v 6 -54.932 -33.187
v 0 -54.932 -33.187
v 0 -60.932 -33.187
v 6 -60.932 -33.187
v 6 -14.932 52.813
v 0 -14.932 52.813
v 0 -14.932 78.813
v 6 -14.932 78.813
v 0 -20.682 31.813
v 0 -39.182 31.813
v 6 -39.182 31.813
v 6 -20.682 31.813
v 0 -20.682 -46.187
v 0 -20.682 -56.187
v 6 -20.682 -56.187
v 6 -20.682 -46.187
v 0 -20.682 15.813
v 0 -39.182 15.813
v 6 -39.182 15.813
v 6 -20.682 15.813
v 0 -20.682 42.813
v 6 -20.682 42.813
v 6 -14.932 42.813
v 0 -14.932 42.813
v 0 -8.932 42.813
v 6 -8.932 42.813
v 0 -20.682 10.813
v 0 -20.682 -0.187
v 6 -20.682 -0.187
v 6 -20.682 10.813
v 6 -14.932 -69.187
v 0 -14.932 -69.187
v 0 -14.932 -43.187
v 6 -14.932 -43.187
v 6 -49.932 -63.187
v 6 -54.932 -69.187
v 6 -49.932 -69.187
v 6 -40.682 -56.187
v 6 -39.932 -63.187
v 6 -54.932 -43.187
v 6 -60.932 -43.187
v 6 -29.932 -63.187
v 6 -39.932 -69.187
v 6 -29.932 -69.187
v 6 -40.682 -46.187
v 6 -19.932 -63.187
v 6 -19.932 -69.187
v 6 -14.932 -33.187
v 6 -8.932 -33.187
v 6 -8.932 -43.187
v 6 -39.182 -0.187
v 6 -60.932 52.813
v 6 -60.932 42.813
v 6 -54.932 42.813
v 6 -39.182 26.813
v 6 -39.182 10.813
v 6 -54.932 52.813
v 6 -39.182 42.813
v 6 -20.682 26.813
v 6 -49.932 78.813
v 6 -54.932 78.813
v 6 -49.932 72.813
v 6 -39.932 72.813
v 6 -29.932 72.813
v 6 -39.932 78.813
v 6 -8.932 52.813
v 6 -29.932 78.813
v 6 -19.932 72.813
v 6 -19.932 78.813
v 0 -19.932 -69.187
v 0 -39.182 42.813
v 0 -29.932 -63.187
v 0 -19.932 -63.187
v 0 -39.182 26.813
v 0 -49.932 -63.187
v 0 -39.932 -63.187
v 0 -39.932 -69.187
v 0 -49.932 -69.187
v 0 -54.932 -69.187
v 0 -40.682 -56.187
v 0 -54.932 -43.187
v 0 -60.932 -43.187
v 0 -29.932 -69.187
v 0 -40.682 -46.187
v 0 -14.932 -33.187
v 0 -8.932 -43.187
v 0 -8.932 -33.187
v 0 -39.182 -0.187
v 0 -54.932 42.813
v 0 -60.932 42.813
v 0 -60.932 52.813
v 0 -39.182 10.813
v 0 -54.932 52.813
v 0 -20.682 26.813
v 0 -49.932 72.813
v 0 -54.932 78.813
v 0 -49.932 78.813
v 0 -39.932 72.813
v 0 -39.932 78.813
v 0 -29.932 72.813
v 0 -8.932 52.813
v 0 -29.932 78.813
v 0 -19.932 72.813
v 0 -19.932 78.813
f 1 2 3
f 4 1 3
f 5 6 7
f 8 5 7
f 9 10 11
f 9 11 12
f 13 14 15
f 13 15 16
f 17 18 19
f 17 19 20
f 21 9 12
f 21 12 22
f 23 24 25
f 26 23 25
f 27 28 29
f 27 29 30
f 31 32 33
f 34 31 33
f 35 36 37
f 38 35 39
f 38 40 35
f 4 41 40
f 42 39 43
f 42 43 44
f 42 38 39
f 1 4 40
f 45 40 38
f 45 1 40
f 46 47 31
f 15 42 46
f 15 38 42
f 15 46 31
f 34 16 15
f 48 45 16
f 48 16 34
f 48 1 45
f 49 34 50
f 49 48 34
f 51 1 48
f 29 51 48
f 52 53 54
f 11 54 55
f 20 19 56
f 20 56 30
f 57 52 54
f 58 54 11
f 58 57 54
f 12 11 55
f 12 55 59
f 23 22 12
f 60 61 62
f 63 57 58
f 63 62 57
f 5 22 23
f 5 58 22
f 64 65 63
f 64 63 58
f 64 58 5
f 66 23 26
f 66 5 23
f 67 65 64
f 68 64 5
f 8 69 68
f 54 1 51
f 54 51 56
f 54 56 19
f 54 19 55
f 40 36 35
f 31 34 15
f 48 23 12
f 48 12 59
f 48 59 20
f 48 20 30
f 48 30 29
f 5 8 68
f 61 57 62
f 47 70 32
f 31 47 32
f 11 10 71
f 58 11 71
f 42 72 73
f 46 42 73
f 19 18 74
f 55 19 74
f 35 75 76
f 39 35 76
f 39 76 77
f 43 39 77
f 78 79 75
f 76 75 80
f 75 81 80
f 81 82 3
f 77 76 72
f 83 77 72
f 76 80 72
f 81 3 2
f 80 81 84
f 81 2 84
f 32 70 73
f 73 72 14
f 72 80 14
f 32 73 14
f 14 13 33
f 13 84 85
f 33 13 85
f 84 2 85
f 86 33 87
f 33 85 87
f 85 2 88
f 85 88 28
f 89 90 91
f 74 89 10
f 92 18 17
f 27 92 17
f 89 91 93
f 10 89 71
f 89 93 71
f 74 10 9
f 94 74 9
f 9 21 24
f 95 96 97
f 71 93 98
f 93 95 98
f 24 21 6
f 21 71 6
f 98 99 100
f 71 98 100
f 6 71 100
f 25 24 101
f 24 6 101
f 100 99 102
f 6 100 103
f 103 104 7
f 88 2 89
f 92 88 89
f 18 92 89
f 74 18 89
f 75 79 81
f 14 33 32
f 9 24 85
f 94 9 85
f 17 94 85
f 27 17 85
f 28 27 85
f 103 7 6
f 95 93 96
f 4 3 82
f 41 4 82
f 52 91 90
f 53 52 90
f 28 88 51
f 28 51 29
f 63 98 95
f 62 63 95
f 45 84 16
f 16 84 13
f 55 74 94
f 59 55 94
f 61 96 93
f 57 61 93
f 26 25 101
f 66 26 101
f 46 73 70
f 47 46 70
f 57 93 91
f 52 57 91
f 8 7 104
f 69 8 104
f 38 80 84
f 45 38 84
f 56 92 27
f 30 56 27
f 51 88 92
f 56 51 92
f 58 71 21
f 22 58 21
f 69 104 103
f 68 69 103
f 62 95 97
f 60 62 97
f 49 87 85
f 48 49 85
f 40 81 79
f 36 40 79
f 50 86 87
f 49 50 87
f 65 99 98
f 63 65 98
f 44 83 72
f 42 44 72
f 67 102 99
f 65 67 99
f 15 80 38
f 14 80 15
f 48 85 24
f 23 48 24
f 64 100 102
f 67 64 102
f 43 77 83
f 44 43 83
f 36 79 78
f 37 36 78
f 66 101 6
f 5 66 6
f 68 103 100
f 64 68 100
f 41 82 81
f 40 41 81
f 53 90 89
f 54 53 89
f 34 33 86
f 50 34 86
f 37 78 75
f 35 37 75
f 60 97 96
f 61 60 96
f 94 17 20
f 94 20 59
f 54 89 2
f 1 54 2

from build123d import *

# Parameters (mm, degrees)
F0_W     = 20
F0_H     = 10
F0_W_2   = 18.5
F0_H_2   = 11
F1_DEPTH = 6


with BuildPart() as f1:
    # F0 (on Right) → F1 (new body)
    with BuildSketch(Plane.YZ):
        Polygon((-60.931503, 42.813338), (-54.931503, 42.813338), (-54.931503, -33.186662), (-60.931503, -33.186662), (-60.931503, -43.186662), (-54.931503, -43.186662), (-54.931503, -69.186662), (-49.931503, -69.186662), (-49.931503, -63.186662), (-39.931503, -63.186662), (-39.931503, -69.186662), (-29.931503, -69.186662), (-29.931503, -63.186662), (-19.931503, -63.186662), (-19.931503, -69.186662), (-14.931503, -69.186662), (-14.931503, -43.186662), (-8.931503, -43.186662), (-8.931503, -33.186662), (-14.931503, -33.186662), (-14.931503, 42.813338), (-8.931503, 42.813338), (-8.931503, 52.813338), (-14.931503, 52.813338), (-14.931503, 78.813338), (-19.931503, 78.813338), (-19.931503, 72.813338), (-29.931503, 72.813338), (-29.931503, 78.813338), (-39.931503, 78.813338), (-39.931503, 72.813338), (-49.931503, 72.813338), (-49.931503, 78.813338), (-54.931503, 78.813338), (-54.931503, 52.813338), (-60.931503, 52.813338), align=None)
        with Locations((-30.681503, -51.186662)):
            Rectangle(F0_W, F0_H, mode=Mode.SUBTRACT)
        with Locations((-29.931503, 5.313338)):
            Rectangle(F0_W_2, F0_H_2, mode=Mode.SUBTRACT)
        with Locations((-29.931503, 21.313338)):
            Rectangle(F0_W_2, F0_H_2, mode=Mode.SUBTRACT)
        with Locations((-29.931503, 37.313338)):
            Rectangle(F0_W_2, F0_H_2, mode=Mode.SUBTRACT)
    extrude(amount=F1_DEPTH)


solid = f1.part
